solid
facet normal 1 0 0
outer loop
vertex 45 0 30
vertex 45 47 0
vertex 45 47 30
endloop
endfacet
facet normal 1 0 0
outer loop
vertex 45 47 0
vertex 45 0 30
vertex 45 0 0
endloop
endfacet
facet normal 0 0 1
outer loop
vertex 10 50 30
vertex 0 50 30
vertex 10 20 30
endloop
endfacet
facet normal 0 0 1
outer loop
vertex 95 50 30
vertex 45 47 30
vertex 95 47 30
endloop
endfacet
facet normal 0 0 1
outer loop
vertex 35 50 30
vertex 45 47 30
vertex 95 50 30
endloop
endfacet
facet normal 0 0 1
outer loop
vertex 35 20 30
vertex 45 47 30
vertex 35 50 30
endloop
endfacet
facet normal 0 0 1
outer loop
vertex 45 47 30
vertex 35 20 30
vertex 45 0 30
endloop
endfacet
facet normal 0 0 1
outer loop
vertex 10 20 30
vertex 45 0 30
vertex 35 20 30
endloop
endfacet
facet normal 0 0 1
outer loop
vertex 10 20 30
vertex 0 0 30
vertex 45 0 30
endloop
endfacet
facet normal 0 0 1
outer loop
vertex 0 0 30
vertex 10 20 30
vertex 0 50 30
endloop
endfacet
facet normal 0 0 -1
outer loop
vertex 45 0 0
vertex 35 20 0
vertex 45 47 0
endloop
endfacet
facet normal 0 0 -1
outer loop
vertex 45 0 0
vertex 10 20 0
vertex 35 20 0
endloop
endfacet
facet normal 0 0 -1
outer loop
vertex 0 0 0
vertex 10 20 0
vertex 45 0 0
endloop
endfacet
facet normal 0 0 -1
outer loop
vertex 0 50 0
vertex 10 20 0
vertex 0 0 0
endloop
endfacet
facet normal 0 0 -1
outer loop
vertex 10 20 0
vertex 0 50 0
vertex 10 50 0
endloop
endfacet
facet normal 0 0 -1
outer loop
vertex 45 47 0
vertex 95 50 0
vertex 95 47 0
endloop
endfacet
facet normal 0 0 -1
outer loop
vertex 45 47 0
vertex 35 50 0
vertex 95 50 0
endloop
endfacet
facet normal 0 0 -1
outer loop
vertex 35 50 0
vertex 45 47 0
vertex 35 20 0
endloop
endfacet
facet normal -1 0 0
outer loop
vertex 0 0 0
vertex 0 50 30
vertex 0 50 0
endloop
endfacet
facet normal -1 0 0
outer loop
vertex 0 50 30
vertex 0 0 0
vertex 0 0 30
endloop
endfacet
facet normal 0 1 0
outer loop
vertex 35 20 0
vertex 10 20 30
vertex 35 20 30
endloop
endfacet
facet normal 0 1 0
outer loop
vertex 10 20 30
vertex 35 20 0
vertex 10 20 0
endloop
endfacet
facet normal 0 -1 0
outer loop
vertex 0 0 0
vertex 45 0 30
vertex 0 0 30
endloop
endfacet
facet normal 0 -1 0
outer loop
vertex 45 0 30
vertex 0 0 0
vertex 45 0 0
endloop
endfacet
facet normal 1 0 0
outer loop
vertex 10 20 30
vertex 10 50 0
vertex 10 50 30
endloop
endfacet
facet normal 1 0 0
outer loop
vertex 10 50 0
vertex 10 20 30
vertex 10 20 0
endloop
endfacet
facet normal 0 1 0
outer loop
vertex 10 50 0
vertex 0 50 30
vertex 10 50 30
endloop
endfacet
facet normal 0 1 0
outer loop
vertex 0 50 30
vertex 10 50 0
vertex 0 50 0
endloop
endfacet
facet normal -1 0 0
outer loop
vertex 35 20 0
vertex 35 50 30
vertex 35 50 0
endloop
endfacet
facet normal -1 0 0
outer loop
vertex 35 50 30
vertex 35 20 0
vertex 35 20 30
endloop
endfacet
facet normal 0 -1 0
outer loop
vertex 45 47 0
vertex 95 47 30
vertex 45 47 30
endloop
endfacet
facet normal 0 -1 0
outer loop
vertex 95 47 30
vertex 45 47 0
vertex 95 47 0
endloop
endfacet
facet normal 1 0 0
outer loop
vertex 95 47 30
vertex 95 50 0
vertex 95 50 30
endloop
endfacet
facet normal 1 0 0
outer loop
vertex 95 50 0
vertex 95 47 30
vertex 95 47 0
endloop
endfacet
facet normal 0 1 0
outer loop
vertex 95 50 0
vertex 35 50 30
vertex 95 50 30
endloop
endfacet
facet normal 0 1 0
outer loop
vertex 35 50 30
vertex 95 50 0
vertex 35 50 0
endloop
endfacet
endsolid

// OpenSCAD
z_dim = 30;

union(){
    cube([45,20,z_dim]) {} // back support
    cube([10,50,z_dim]) {} // bottom arm
    translate([35,0,0]){
        cube([10,47,z_dim]) {} // top arm
    }
    translate([35,47,0]){
        cube([60,3,z_dim]) {} // paper_shield
    }
}
